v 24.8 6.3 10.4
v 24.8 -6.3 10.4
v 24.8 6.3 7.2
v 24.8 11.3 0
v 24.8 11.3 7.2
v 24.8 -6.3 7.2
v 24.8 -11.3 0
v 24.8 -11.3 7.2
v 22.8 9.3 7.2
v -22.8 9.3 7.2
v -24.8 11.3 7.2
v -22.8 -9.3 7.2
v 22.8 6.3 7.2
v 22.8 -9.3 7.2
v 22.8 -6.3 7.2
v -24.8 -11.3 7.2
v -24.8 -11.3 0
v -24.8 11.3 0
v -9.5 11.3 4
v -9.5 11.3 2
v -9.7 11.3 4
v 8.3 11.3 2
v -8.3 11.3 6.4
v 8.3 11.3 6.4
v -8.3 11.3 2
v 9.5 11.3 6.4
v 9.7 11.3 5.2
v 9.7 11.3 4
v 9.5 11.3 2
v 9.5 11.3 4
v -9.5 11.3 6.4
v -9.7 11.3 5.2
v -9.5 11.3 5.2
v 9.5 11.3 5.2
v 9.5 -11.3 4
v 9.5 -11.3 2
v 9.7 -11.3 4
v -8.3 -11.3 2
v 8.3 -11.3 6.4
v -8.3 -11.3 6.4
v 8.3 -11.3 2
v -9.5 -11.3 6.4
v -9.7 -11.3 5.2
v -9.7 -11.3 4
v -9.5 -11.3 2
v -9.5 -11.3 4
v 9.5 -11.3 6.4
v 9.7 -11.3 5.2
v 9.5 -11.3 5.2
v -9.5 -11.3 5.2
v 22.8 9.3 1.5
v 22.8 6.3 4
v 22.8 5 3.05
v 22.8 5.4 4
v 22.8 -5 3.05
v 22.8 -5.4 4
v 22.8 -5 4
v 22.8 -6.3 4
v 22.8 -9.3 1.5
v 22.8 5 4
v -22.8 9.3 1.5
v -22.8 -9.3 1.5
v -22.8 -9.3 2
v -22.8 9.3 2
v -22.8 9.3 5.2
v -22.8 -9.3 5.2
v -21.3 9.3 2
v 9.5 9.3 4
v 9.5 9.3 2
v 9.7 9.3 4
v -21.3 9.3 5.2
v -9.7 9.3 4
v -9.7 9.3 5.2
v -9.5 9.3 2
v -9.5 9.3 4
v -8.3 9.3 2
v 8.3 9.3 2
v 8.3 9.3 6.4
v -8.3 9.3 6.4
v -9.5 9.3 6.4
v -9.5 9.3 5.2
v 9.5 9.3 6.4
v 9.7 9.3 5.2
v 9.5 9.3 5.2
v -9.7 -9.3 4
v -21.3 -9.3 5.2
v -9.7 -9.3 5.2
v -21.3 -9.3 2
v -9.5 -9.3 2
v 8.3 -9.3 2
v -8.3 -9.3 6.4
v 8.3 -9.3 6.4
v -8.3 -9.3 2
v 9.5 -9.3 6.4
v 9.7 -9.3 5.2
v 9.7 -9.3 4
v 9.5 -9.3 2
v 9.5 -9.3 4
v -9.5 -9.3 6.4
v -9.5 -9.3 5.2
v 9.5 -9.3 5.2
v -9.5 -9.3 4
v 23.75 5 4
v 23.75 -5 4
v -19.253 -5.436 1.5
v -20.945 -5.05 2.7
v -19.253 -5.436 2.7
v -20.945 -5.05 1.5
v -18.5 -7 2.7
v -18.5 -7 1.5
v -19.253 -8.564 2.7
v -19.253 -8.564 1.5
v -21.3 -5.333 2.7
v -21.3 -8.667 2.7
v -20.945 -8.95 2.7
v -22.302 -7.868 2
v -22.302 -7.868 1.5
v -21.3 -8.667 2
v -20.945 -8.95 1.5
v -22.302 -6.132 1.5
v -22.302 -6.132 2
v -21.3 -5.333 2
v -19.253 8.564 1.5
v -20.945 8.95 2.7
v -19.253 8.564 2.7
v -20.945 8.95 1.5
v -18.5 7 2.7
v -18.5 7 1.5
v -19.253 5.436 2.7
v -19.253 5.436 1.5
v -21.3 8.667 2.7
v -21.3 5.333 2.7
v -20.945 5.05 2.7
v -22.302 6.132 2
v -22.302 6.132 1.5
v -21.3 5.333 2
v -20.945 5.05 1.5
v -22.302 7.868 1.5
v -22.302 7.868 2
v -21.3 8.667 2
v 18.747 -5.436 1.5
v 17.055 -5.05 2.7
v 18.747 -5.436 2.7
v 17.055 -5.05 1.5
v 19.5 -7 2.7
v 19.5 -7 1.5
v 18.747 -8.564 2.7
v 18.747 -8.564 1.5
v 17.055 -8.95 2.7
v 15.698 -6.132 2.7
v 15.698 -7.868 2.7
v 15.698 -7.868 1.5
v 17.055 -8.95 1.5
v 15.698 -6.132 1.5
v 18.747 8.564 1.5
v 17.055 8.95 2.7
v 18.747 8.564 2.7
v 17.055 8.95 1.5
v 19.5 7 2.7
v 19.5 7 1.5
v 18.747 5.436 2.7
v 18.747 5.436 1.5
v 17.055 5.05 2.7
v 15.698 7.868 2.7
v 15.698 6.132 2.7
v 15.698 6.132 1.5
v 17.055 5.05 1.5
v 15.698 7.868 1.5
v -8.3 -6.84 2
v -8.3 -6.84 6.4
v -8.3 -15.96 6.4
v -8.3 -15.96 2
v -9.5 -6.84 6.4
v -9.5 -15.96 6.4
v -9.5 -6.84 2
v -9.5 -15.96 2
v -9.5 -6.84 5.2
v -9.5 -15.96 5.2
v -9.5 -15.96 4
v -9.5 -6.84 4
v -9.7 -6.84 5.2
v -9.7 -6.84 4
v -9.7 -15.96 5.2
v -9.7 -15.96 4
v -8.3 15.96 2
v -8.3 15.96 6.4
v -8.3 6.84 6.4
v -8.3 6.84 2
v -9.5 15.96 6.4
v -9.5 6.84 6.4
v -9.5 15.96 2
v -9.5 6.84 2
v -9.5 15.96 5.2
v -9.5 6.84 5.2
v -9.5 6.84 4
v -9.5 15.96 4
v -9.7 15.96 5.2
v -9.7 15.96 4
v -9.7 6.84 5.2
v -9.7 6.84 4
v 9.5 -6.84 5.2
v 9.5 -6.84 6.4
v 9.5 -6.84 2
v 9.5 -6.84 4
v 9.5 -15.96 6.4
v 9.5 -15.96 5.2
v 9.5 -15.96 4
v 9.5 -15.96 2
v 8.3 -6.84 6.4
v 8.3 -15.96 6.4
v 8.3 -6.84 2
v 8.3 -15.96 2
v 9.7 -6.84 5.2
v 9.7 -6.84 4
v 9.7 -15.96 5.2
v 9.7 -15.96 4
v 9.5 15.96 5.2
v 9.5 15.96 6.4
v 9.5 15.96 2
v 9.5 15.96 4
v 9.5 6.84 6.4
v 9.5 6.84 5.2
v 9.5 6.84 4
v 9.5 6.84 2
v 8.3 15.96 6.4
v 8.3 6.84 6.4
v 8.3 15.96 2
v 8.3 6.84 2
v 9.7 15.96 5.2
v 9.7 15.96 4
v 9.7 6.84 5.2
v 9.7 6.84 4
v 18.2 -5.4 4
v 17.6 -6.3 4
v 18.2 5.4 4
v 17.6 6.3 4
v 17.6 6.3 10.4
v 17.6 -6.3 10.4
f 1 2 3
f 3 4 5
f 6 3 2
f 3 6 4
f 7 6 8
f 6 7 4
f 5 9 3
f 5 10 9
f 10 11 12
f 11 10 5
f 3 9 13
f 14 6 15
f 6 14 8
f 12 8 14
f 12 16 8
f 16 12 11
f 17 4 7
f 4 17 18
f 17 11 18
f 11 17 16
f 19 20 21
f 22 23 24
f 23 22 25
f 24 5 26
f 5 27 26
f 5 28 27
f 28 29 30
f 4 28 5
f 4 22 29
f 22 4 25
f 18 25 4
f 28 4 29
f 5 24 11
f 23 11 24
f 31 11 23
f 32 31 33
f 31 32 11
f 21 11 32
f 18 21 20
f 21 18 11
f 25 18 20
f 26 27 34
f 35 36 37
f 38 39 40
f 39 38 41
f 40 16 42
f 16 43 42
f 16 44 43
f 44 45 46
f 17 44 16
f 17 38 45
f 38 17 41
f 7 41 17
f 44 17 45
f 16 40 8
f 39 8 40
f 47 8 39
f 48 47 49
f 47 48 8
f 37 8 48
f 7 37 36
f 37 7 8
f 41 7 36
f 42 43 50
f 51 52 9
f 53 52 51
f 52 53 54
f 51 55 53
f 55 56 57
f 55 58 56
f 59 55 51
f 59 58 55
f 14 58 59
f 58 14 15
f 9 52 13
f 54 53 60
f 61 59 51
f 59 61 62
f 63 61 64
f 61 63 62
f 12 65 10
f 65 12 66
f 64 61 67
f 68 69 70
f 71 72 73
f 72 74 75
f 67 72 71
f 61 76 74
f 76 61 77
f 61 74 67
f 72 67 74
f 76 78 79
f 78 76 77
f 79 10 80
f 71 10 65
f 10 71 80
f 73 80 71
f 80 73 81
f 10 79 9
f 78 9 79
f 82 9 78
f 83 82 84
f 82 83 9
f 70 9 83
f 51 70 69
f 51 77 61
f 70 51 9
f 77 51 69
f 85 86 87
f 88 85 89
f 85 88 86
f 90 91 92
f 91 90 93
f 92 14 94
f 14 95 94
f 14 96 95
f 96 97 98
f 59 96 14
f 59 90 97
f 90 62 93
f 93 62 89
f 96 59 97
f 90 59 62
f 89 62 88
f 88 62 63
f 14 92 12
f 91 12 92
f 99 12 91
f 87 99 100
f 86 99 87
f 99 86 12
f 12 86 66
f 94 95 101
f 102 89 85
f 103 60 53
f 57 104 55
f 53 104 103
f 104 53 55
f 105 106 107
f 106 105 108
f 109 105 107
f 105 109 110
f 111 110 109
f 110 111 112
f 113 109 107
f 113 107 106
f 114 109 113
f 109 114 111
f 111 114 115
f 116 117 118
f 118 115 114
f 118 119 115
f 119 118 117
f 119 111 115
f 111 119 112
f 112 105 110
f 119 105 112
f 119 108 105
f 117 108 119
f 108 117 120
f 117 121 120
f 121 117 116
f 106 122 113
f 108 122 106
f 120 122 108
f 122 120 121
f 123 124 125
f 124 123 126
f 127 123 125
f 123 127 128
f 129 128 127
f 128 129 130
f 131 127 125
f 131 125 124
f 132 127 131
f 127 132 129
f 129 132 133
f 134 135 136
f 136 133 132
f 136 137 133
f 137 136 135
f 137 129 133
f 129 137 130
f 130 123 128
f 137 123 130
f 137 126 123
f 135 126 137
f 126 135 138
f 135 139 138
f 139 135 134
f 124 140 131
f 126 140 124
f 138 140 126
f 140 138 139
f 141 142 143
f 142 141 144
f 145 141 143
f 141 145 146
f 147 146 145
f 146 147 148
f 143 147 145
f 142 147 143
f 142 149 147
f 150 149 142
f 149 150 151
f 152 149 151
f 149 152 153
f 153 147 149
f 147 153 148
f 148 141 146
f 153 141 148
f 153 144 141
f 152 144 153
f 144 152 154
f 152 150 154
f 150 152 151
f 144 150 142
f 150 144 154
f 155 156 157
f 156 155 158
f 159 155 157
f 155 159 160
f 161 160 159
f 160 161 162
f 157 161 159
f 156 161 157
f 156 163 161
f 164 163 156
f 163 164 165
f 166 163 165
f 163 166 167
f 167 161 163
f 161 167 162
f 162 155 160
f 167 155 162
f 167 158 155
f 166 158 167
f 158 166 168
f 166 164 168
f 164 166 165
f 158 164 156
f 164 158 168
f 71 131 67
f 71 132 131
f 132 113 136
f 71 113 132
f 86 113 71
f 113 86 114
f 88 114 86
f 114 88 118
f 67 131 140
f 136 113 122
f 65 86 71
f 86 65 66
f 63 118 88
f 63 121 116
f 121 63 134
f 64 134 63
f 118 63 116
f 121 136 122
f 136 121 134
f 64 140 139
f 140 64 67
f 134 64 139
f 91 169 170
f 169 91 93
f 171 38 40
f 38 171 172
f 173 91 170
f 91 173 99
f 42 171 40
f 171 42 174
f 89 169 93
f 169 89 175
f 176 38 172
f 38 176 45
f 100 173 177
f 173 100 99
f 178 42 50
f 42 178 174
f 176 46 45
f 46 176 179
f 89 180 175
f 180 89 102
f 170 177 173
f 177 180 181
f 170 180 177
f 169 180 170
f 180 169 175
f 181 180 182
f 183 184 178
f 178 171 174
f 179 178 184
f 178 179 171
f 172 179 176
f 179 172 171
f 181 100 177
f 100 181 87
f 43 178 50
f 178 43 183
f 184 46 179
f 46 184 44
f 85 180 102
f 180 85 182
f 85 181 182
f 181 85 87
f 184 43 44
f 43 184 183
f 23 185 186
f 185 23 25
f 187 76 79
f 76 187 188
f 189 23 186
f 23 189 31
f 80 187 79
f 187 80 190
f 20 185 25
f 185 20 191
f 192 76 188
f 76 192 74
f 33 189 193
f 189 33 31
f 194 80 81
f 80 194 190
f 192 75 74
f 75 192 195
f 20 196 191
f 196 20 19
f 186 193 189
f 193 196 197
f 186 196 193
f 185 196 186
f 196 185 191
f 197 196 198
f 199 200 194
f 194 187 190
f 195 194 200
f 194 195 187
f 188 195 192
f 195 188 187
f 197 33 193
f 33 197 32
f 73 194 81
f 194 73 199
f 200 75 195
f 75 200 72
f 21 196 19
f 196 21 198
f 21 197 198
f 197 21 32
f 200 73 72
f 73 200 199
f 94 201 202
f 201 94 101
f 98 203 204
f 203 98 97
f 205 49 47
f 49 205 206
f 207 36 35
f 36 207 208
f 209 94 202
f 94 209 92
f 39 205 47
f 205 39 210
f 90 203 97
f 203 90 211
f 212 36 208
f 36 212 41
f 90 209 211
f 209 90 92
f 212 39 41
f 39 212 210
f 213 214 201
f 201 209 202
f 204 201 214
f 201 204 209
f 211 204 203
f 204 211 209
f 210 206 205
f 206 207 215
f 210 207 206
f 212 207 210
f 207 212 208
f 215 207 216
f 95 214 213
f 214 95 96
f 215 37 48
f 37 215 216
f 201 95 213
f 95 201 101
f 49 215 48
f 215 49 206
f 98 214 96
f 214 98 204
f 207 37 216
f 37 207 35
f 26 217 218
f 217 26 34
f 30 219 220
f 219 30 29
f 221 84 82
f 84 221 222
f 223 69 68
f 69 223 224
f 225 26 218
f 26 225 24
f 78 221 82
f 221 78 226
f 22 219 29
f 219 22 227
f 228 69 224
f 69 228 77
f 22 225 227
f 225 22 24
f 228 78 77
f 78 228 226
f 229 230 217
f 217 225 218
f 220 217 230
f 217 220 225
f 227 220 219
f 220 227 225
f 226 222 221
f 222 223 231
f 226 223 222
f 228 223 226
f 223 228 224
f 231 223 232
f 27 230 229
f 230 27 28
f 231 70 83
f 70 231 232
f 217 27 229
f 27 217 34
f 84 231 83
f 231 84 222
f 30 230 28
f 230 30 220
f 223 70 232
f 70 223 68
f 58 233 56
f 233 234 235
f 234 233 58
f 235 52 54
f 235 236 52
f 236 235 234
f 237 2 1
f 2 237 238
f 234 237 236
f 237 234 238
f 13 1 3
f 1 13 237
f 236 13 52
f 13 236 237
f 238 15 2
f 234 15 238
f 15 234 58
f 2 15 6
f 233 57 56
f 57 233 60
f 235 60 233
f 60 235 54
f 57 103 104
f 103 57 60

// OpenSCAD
// Parameters
pcb_length = 45.0; //[22.5:90.0:0.1]
pcb_width = 18.0; //[9.0:36.0:0.1]
pcb_thickness = 1.6; //[0.8:3.2:0.1]
case_wall_thickness = 2.0; //[1.0:4.0:0.1]
base_thickness = 2.0; //[1.0:4.0:0.1]
internal_clearance_xy = 0.3; //[0.1:1.0:0.05]
internal_clearance_z = 0.4; //[0.1:1.5:0.05]
clip_thickness = 1.2; //[0.6:2.4:0.1]
clip_overhang = 0.8; //[0.4:1.6:0.1]
clip_gap = 0.4; //[0.2:1.0:0.05]
clip_lead_in_chamfer = 0.8; //[0.4:2.0:0.1]
standoff_height = 1.2; //[0.6:2.4:0.1]
standoff_diameter = 4.0; //[2.0:8.0:0.1]
usb_cutout_width = 9.0; //[4.5:18.0:0.1]
usb_cutout_height = 4.0; //[2.0:8.0:0.1]
usb_cutout_depth = 6.0; //[3.0:12.0:0.1]
usb_cutout_clearance = 0.5; //[0.2:1.5:0.05]
overlap = 1.0; //[0.5:2.0:0.1]
case_inner_length = 45.6; //[23.0:91.0:0.1]
case_inner_width = 18.6; //[9.5:37.0:0.1]
case_inner_height = 5.2; //[3.0:12.0:0.1]
case_outer_length = 49.6; //[25.0:99.0:0.1]
case_outer_width = 22.6; //[11.0:45.0:0.1]
case_outer_height = 7.2; //[4.0:16.0:0.1]

// Main Body Outer
module main_body_outer() {
  translate([0, 0, case_outer_height/2])
    cube([case_outer_length, case_outer_width, case_outer_height], center=true);
}

// PCB Bay Void
module pcb_bay_void() {
  translate([0, 0, base_thickness + case_inner_height/2])
    cube([case_inner_length, case_inner_width, case_inner_height + overlap], center=true);
}

// USB Port Cutout Void
module usb_port_cutout_void() {
  translate([case_outer_length/2 - (usb_cutout_depth + overlap)/2, 0, base_thickness + standoff_height + pcb_thickness/2 + (usb_cutout_height + 2*usb_cutout_clearance)/2])
    cube([usb_cutout_depth + overlap, usb_cutout_width + 2*usb_cutout_clearance, usb_cutout_height + 2*usb_cutout_clearance], center=true);
}

// Cable Clearance Chamfer Void
module cable_clearance_chamfer_void() {
  translate([case_outer_length/2 - (usb_cutout_depth + overlap)/2, 0, base_thickness + standoff_height + pcb_thickness/2 + (usb_cutout_height + 2*usb_cutout_clearance)/2])
    rotate([0, 45, 0])
    cube([usb_cutout_depth + overlap, usb_cutout_width + 2*usb_cutout_clearance, usb_cutout_height + 2*usb_cutout_clearance], center=true);
}

// Standoff Cylinder
module standoff_cyl() {
  translate([0, 0, base_thickness + standoff_height/2 - overlap/2])
    cylinder(h=standoff_height, r=standoff_diameter/2, center=true);
}

// End Stop Block
module end_stop_block() {
  translate([-case_inner_length/2 + case_wall_thickness/2 - overlap/2, 0, base_thickness + (standoff_height + pcb_thickness + internal_clearance_z)/2])
    cube([case_wall_thickness, case_inner_width, standoff_height + pcb_thickness + internal_clearance_z], center=true);
}

// Clip Arm
module clip_arm() {
  translate([0, 0, base_thickness + (case_inner_height - clip_lead_in_chamfer)/2])
    cube([clip_thickness, case_inner_length/5, case_inner_height - clip_lead_in_chamfer], center=true);
}

// Clip Lip
module clip_lip() {
  translate([0, 0, base_thickness + standoff_height + pcb_thickness + internal_clearance_z - clip_thickness/2])
    cube([clip_overhang, case_inner_length/5, clip_thickness], center=true);
}

// USB Reference B
module usb_ref_B() {
  translate([case_outer_length/2 - usb_cutout_depth/2, 0, base_thickness + standoff_height + pcb_thickness/2 + usb_cutout_height/2])
    cube([usb_cutout_depth, usb_cutout_width, usb_cutout_height], center=true);
}

// USB Reference uA
module usb_ref_uA() {
  translate([case_outer_length/2 - (usb_cutout_depth*0.8)/2, 0, base_thickness + standoff_height + pcb_thickness/2 + (usb_cutout_height*0.7)/2])
    cube([usb_cutout_depth*0.8, usb_cutout_width*0.8, usb_cutout_height*0.7], center=true);
}

// USB Reference Ax2
module usb_ref_Ax2() {
  translate([case_outer_length/2 - (usb_cutout_depth*1.2)/2, 0, base_thickness + standoff_height + pcb_thickness/2 + (usb_cutout_height*1.6)/2])
    cube([usb_cutout_depth*1.2, usb_cutout_width*1.4, usb_cutout_height*1.6], center=true);
}

// USB Reference C
module usb_ref_C() {
  translate([case_outer_length/2 - (usb_cutout_depth*0.9)/2, 0, base_thickness + standoff_height + pcb_thickness/2 + (usb_cutout_height*0.8)/2])
    cube([usb_cutout_depth*0.9, usb_cutout_width*0.9, usb_cutout_height*0.8], center=true);
}

// USB Reference Ax1
module usb_ref_Ax1() {
  translate([case_outer_length/2 - (usb_cutout_depth*1.1)/2, 0, base_thickness + standoff_height + pcb_thickness/2 + (usb_cutout_height*1.3)/2])
    cube([usb_cutout_depth*1.1, usb_cutout_width*1.2, usb_cutout_height*1.3], center=true);
}

// Operations
module op_pcb_bay() {
  difference() {
    main_body_outer();
    pcb_bay_void();
  }
}

module op_usb_port_cutout() {
  difference() {
    op_pcb_bay();
    usb_port_cutout_void();
  }
}

module op_cable_clearance_chamfer() {
  difference() {
    op_usb_port_cutout();
    cable_clearance_chamfer_void();
  }
}

module op_standoff_1_pos() {
  translate([-case_inner_length/2 + standoff_diameter/2 + internal_clearance_xy, -case_inner_width/2 + standoff_diameter/2 + internal_clearance_xy, 0])
    standoff_cyl();
}

module op_standoff_2_pos() {
  translate([-case_inner_length/2 + standoff_diameter/2 + internal_clearance_xy, case_inner_width/2 - standoff_diameter/2 - internal_clearance_xy, 0])
    standoff_cyl();
}

module op_standoff_3_pos() {
  translate([case_inner_length/2 - standoff_diameter/2 - internal_clearance_xy - usb_cutout_depth/2, -case_inner_width/2 + standoff_diameter/2 + internal_clearance_xy, 0])
    standoff_cyl();
}

module op_standoff_4_pos() {
  translate([case_inner_length/2 - standoff_diameter/2 - internal_clearance_xy - usb_cutout_depth/2, case_inner_width/2 - standoff_diameter/2 - internal_clearance_xy, 0])
    standoff_cyl();
}

module op_board_standoffs() {
  union() {
    op_standoff_1_pos();
    op_standoff_2_pos();
    op_standoff_3_pos();
    op_standoff_4_pos();
  }
}

module op_end_stops() {
  union() {
    end_stop_block();
    end_stop_block();
  }
}

module op_clip_arm_left_1() {
  translate([-case_inner_width/2 - clip_thickness/2 + overlap, -case_inner_length/4, 0])
    clip_arm();
}

module op_clip_lip_left_1() {
  translate([-case_inner_width/2 + clip_overhang/2 - clip_gap, -case_inner_length/4, 0])
    clip_lip();
}

module op_clip_left_1() {
  union() {
    op_clip_arm_left_1();
    op_clip_lip_left_1();
  }
}

module op_clip_arm_left_2() {
  translate([-case_inner_width/2 - clip_thickness/2 + overlap, case_inner_length/4, 0])
    clip_arm();
}

module op_clip_lip_left_2() {
  translate([-case_inner_width/2 + clip_overhang/2 - clip_gap, case_inner_length/4, 0])
    clip_lip();
}

module op_clip_left_2() {
  union() {
    op_clip_arm_left_2();
    op_clip_lip_left_2();
  }
}

module op_clip_arm_right_1() {
  translate([case_inner_width/2 + clip_thickness/2 - overlap, -case_inner_length/4, 0])
    clip_arm();
}

module op_clip_lip_right_1() {
  translate([case_inner_width/2 - clip_overhang/2 + clip_gap, -case_inner_length/4, 0])
    clip_lip();
}

module op_clip_right_1() {
  union() {
    op_clip_arm_right_1();
    op_clip_lip_right_1();
  }
}

module op_clip_arm_right_2() {
  translate([case_inner_width/2 + clip_thickness/2 - overlap, case_inner_length/4, 0])
    clip_arm();
}

module op_clip_lip_right_2() {
  translate([case_inner_width/2 - clip_overhang/2 + clip_gap, case_inner_length/4, 0])
    clip_lip();
}

module op_clip_right_2() {
  union() {
    op_clip_arm_right_2();
    op_clip_lip_right_2();
  }
}

module op_snap_fit_clips() {
  union() {
    op_clip_left_1();
    op_clip_left_2();
    op_clip_right_1();
    op_clip_right_2();
  }
}

module op_main_body() {
  union() {
    op_cable_clearance_chamfer();
    op_board_standoffs();
    op_end_stops();
    op_snap_fit_clips();
  }
}

module op_usb_reference_union() {
  union() {
    usb_ref_B();
    usb_ref_uA();
    usb_ref_Ax2();
    usb_ref_C();
    usb_ref_Ax1();
  }
}

module op_final_model() {
  union() {
    op_main_body();
    op_usb_reference_union();
  }
}

// Final Output
op_final_model();
